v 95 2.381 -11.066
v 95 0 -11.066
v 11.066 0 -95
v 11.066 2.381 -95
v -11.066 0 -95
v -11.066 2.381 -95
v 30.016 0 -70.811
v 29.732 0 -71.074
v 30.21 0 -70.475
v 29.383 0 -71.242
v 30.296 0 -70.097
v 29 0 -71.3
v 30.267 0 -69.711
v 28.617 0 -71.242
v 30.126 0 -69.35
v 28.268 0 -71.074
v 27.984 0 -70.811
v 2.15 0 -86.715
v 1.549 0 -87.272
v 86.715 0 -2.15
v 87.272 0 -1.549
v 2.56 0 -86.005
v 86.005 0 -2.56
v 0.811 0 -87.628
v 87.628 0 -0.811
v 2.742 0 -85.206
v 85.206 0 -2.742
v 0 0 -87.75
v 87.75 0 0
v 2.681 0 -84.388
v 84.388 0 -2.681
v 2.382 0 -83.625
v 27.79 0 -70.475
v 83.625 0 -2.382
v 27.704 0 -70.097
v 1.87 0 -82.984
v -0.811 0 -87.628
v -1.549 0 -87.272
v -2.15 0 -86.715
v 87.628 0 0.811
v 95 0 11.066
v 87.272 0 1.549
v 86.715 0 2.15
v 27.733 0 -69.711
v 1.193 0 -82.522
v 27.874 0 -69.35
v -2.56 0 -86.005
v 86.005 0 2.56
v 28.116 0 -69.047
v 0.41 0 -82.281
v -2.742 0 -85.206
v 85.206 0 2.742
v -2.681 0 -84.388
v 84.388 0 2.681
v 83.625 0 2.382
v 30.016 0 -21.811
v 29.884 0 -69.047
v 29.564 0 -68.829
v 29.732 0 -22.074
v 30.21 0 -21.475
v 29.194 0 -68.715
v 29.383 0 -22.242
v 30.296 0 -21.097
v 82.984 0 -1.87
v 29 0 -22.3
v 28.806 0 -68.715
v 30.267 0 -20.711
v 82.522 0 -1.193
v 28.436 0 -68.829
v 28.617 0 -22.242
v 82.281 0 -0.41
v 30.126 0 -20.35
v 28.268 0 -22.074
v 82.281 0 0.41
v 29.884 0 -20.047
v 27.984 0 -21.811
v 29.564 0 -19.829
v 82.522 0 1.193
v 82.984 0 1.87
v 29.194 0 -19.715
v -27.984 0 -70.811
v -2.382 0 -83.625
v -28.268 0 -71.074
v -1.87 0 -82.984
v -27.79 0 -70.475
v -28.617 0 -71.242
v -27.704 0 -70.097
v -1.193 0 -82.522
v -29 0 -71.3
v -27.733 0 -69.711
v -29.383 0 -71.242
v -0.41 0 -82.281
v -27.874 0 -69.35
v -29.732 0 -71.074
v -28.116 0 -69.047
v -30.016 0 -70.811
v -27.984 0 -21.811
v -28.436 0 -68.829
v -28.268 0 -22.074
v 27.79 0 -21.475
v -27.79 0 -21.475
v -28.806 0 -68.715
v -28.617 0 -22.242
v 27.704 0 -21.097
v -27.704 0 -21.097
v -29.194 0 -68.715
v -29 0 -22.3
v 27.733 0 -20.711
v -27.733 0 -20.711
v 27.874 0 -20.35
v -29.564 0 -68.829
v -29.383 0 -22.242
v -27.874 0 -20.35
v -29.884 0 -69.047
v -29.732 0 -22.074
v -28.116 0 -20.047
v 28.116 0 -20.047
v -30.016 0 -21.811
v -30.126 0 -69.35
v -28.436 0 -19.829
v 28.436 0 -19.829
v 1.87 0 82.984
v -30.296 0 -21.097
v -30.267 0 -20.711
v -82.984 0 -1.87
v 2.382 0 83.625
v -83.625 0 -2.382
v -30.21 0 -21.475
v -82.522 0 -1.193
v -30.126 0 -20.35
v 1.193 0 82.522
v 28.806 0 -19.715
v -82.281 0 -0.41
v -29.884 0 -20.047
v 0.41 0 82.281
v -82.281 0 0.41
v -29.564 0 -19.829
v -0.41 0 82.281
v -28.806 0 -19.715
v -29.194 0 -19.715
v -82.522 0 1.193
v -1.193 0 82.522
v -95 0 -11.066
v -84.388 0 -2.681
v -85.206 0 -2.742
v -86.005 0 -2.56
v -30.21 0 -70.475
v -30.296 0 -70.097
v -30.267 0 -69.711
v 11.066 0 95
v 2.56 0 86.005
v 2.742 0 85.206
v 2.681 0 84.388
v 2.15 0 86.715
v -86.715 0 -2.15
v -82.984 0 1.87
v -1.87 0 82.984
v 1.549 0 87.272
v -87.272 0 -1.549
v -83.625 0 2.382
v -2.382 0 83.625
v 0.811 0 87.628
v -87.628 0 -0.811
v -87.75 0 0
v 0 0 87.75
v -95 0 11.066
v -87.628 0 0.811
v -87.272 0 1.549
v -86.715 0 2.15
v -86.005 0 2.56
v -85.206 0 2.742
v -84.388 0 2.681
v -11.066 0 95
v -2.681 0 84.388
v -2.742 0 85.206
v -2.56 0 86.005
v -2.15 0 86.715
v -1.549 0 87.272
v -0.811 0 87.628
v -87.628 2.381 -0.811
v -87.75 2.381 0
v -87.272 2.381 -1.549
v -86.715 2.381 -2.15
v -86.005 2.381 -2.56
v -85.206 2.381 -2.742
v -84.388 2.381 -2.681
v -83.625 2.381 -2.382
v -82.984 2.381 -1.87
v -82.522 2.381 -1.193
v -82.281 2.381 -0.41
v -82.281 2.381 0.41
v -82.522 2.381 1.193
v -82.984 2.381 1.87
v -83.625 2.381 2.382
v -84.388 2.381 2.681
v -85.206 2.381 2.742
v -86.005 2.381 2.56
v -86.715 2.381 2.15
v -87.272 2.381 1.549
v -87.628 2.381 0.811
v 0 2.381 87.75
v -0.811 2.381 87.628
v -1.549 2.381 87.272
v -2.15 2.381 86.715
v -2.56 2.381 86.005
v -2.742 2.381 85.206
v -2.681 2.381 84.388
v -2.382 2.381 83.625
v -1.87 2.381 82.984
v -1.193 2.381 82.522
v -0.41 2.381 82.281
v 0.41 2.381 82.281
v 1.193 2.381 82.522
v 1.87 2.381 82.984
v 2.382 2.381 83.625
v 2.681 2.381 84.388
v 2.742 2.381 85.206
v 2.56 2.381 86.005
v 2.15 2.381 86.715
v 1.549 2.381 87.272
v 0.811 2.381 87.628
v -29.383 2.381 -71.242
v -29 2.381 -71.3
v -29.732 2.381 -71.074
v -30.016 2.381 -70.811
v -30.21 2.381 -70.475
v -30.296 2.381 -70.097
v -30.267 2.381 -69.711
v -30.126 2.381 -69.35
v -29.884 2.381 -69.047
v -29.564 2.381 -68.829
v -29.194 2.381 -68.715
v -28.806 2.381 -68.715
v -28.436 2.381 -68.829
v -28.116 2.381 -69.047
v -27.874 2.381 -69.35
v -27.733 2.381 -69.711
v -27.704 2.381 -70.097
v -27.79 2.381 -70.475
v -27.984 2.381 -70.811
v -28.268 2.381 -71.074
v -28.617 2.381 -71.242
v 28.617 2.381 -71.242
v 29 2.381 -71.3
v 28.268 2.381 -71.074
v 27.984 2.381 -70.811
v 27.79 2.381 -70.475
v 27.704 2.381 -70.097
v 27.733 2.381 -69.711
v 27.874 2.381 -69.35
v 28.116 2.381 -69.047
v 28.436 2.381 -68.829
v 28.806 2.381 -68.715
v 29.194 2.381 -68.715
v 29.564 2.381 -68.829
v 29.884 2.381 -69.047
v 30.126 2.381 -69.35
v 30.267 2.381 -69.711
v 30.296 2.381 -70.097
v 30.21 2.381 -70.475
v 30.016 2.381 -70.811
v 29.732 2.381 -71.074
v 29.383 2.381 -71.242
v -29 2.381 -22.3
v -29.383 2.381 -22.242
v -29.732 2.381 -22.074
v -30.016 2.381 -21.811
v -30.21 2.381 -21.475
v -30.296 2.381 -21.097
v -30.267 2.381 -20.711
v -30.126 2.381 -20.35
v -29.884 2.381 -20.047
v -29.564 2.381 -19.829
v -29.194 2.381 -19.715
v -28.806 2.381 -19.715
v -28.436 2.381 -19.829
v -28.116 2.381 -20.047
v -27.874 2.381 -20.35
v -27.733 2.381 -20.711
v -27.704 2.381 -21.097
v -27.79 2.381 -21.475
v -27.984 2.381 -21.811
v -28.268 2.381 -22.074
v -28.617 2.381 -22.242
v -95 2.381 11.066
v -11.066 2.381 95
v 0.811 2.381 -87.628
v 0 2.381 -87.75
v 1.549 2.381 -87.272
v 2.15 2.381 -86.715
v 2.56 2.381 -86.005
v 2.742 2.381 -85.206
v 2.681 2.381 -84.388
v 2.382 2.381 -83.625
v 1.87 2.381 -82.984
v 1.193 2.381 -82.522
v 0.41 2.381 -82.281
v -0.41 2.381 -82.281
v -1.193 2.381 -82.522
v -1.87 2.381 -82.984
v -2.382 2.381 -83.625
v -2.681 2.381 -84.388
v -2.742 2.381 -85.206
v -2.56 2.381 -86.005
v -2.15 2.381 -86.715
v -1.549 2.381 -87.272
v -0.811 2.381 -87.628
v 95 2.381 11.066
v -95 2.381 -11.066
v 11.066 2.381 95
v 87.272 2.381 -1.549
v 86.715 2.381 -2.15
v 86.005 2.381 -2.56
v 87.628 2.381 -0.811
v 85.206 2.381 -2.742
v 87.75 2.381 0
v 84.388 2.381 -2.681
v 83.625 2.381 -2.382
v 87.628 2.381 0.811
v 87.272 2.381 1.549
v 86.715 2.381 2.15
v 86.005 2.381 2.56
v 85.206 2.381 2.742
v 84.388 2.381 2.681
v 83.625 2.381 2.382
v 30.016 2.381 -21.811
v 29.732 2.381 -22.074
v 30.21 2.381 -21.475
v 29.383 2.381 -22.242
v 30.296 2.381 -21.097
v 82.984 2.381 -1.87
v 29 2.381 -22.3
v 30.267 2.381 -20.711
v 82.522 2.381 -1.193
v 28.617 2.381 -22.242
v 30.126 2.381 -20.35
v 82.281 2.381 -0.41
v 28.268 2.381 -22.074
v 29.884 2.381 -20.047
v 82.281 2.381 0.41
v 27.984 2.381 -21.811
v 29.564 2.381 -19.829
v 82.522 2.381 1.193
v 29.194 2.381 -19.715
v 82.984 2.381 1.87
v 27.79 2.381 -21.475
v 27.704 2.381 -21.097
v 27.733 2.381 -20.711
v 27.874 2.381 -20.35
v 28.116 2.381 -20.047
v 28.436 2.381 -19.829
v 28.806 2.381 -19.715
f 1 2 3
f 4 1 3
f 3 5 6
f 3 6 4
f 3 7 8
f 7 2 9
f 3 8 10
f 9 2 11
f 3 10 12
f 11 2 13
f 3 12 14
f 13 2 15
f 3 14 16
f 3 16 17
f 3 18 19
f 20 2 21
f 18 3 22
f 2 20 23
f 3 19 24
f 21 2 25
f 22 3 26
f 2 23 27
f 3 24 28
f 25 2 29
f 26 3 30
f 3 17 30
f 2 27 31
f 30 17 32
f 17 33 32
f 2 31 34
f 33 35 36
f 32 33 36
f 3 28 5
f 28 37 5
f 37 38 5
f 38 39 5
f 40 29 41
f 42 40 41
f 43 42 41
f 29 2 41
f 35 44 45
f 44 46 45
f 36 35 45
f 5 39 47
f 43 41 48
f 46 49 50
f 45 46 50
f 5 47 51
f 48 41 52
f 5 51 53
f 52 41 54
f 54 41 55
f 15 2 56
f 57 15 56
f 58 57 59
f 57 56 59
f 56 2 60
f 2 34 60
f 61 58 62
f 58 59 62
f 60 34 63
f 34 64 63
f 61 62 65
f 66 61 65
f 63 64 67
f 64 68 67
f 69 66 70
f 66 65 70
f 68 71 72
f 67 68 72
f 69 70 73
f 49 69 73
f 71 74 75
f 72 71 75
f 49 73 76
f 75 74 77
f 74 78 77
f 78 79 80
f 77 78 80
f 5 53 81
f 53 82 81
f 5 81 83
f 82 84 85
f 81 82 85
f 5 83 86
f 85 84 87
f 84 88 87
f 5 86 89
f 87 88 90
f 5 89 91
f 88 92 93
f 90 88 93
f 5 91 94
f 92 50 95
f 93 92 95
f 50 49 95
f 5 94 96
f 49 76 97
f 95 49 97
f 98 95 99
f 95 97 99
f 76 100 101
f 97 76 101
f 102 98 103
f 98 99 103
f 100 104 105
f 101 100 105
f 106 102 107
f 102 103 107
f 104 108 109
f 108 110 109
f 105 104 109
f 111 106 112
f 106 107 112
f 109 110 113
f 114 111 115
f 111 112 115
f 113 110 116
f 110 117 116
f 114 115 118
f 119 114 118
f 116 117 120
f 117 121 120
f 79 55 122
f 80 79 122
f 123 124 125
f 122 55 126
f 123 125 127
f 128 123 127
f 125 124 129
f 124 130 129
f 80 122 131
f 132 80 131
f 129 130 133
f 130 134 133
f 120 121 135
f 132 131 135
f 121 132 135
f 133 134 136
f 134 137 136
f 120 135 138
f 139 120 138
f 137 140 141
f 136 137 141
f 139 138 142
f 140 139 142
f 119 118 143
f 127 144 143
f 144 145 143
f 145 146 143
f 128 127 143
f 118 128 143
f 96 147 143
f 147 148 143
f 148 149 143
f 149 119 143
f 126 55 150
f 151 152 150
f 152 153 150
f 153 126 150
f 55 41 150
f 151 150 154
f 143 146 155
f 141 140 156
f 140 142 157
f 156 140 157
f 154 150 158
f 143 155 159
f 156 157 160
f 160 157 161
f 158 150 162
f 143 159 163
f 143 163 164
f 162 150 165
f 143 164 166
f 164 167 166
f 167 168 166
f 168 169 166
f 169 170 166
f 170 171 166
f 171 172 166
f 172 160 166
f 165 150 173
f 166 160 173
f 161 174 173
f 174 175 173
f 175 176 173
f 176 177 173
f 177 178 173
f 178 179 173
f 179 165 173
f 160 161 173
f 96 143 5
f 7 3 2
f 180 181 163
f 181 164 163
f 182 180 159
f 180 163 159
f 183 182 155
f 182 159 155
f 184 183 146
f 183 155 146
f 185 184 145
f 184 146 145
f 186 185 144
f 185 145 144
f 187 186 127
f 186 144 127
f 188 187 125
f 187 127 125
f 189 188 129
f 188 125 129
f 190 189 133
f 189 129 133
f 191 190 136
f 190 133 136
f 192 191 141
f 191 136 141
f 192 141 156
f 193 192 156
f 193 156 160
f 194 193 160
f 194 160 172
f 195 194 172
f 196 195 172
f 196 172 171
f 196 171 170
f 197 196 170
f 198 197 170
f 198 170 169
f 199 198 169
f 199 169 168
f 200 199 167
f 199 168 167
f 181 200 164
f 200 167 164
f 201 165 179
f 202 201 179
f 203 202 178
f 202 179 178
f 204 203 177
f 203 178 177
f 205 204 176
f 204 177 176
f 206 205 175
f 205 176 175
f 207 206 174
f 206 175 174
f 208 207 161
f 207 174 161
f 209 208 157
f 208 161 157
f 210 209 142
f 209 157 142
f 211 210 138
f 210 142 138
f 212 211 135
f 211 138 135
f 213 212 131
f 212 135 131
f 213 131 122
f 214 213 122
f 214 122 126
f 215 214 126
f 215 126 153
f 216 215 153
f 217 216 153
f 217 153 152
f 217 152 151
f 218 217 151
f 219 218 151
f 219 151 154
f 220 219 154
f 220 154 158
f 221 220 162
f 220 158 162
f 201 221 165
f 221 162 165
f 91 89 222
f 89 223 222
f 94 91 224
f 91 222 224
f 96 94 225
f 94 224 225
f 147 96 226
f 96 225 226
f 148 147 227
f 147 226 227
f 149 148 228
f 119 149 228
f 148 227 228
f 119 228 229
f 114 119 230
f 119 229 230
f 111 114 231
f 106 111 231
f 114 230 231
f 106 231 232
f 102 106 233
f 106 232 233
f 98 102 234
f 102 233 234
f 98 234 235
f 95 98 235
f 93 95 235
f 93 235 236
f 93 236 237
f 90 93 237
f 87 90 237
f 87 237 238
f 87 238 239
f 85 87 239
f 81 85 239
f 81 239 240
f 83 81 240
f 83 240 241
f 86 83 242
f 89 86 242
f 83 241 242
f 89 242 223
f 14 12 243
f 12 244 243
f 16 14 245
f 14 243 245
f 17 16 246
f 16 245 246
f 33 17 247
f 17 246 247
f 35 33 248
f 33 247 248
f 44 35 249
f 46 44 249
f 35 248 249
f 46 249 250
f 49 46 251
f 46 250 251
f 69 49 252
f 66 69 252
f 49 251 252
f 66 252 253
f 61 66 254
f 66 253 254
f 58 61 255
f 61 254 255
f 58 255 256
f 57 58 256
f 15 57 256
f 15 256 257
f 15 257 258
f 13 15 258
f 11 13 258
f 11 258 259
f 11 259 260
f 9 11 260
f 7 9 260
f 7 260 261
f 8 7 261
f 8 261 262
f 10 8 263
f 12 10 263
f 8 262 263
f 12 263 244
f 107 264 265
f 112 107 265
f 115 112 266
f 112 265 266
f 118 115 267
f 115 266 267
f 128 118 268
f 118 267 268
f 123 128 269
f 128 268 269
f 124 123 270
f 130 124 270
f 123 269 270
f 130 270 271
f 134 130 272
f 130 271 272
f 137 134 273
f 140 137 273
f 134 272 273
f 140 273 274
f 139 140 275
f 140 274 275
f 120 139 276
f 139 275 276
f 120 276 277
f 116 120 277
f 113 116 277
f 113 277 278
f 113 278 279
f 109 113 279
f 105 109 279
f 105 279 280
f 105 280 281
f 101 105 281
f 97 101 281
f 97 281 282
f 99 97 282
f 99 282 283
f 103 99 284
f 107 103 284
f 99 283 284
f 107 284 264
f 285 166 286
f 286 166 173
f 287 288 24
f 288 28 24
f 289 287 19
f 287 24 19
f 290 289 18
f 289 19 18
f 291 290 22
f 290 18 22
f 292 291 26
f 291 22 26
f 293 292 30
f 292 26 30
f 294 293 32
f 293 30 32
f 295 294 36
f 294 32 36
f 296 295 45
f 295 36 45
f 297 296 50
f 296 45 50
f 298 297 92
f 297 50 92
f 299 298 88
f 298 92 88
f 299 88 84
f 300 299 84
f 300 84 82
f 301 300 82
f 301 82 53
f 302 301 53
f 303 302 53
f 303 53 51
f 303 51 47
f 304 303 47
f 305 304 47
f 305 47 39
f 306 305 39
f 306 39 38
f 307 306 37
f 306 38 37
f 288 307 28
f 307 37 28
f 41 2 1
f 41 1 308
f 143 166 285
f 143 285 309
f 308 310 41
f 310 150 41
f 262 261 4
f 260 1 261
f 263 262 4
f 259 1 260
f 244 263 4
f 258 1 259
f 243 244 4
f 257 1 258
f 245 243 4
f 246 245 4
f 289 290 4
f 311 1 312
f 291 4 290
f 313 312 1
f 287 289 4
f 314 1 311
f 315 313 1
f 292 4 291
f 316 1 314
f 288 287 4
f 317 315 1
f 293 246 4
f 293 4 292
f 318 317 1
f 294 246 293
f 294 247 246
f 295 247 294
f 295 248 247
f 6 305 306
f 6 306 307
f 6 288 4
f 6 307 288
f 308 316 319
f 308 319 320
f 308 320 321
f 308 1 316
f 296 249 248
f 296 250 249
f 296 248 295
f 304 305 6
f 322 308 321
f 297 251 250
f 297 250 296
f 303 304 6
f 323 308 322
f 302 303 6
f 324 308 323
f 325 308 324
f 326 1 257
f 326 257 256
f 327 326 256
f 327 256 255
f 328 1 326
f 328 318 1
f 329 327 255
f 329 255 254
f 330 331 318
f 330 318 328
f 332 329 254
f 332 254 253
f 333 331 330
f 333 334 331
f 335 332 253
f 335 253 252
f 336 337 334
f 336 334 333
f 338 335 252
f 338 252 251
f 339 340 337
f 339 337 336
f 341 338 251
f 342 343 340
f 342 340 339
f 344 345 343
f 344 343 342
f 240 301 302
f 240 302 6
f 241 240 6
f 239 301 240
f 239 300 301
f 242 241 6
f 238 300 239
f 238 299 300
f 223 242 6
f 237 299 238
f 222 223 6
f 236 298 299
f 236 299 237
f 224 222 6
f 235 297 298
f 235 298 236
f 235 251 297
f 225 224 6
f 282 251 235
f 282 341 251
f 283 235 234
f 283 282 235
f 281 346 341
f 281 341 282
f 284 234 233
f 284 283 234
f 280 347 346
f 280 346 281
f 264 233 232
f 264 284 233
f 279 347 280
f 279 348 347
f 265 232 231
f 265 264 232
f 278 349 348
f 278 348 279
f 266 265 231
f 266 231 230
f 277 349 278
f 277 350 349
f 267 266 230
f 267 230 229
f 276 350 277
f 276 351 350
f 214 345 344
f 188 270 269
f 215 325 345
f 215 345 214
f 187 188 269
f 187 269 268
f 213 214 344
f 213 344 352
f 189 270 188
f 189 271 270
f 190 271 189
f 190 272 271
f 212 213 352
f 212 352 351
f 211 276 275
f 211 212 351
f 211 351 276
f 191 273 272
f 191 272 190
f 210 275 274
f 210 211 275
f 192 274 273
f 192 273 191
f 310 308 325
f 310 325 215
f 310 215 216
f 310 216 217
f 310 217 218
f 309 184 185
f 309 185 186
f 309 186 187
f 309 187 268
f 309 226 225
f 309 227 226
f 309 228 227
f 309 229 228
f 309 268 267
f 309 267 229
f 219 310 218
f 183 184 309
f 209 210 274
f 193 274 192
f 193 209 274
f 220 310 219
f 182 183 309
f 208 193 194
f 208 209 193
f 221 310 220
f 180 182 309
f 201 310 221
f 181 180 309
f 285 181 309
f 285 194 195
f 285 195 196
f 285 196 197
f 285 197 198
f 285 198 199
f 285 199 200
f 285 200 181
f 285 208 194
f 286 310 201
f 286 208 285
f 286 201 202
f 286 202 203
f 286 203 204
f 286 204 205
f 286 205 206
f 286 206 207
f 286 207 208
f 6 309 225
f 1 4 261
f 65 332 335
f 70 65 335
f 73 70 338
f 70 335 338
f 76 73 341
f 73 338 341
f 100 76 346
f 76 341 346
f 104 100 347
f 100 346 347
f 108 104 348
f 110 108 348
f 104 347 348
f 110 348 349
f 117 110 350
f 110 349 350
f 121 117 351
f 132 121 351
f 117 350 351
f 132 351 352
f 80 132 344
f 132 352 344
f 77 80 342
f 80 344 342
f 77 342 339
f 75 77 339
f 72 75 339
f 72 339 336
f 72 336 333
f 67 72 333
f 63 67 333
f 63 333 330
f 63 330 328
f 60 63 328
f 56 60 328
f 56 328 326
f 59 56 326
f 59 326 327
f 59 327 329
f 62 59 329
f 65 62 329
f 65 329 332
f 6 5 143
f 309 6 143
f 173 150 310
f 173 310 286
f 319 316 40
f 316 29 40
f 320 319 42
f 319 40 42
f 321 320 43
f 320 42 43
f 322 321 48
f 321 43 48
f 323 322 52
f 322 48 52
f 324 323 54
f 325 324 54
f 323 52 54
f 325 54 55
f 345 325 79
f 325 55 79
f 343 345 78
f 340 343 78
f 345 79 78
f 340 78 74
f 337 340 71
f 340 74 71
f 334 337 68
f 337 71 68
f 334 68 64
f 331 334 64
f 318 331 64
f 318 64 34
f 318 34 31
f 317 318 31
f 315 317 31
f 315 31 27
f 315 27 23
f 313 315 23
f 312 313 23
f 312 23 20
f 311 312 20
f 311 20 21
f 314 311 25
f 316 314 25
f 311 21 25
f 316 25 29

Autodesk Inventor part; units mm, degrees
ref_plane "YZ Plane" through (0, 0, 0) normal (1, 0, 0) x (0, 1, 0)
ref_plane "XZ Plane" through (0, 0, 0) normal (0, 1, 0) x (-1, 0, 0)
ref_plane "XY Plane" through (0, 0, 0) normal (0, 0, 1) x (1, 0, 0)
sketch "Sketch1" plane through (0, 0, 0) normal (0, 1, 0) x (-1, 0, 0)
  line L0 (95, -95) -> (-95, -95)
  line L1 (-95, -95) -> (-95, 95)
  line L2 (-95, 95) -> (95, 95)
  line L3 (95, 95) -> (95, -95)
  line L4 (95, -95) -> (-95, 95) construction
  line L5 (-95, -95) -> (95, 95) construction
  point P0 (0, 0)
  point P1 (0, 0)
  point P2 (0, 0)
  dimension "d25" = 190
extrude "Extrusion1" add sketch "Sketch1" along normal blind 2.3813
sketch "Sketch2" plane through (0, 2.3813, 0) normal (0, 1, 0) x (1, 0, 0)
  line L0 (-95, -95) -> (95, -95) projected
  point P0 (0, 0)
  point P1 (0, -85)
  dimension "d26" = 10
hole "Hole1" at (0, 2.3813, 85) direction (0, -1, 0) diameter 5.5 end through all clearance for "Socket Head Cap Screw" size "M5" standard "Ansi Metric M Profile"
pattern_circular "Circular Pattern1" count 4 over 360 about axis through (0, -10, 0) along (0, 1, 0) of "Hole1"
sketch "Sketch3" plane through (0, 0, 0) normal (0, -1, 0) x (1, 0, 0)
  circle A0 centre (-85, 0) radius 2.75 projected
  circle A1 centre (0, -85) radius 2.75 projected
  circle A2 centre (85, 0) radius 2.75 projected
  circle A3 centre (0, 85) radius 2.75 projected
  line L0 (-95, -95) -> (95, -95) projected
  line L1 (95, -95) -> (95, 95) projected
  line L2 (95, 95) -> (-95, 95) projected
  line L3 (-95, 95) -> (-95, -95) projected
  line L4 (0, 106.066) -> (106.066, 0)
  line L5 (106.066, 0) -> (0, -106.066)
  line L6 (0, -106.066) -> (-106.066, 0)
  line L7 (-106.066, 0) -> (0, 106.066)
  line L8 (-106.066, 0) -> (106.066, 0) construction
  line L9 (0, -106.066) -> (0, 106.066) construction
  point P0 (0, 0)
  point P1 (0, 0)
  point P2 (0, 0)
  dimension "d27" = 150
  dimension "d28" = 150
extrude "Extrusion2" cut sketch "Sketch3" against normal through all contours L6 L3 L7 L2 L4 L1 L5 L0 | L0 L5 L6 | L6 L7 L3 | L1 L4 L5 | L7 L4 L2 keep common part
sketch "Sketch4" plane through (0, 0, 0) normal (0, -1, 0) x (1, 0, 0)
  line L0 (-11.066, -95) -> (-95, -11.066) projected
  line L1 (-11.066, -95) -> (11.066, -95) projected
  line L2 (95, -11.066) -> (11.066, -95) projected
  line L3 (95, -11.066) -> (95, 11.066) projected
  line L4 (11.066, 95) -> (95, 11.066) projected
  line L5 (11.066, 95) -> (-11.066, 95) projected
  line L6 (-95, 11.066) -> (-11.066, 95) projected
  line L7 (-95, 11.066) -> (-95, -11.066) projected
  circle A0 centre (-85, 0) radius 2.75 projected
  circle A1 centre (0, -85) radius 2.75 projected
  circle A2 centre (85, 0) radius 2.75 projected
  circle A3 centre (0, 85) radius 2.75 projected
  line L8 (-36.066, -70) -> (36.066, -70) construction
  line L9 (-29, -70) -> (29, -70) construction
  line L10 (29, -70) -> (29, -21) construction
  line L11 (29, -21) -> (-29, -21) construction
  line L12 (-29, -21) -> (-29, -70) construction
  line L13 (0, -21) -> (0, -70) construction
  point P0 (0, 0)
  point P1 (0, -70)
  dimension "d31" = 25
  dimension "d32" = 58
  dimension "d33" = 49
hole "Hole2" at (-29, 0, -21) at (29, 0, -21) at (29, 0, -70) at (-29, 0, -70) direction (0, 1, 0) diameter 2.6 end through all
equation "\"d7\" = suppourtPanelThickness"
equation "\"d28\" = d27"
equation "\"panelChamfer\" = 75"
equation "\"suppourtPanelThickness\" = 2.38125"
properties part number "piMount" material "Polycarbonate, Clear"
